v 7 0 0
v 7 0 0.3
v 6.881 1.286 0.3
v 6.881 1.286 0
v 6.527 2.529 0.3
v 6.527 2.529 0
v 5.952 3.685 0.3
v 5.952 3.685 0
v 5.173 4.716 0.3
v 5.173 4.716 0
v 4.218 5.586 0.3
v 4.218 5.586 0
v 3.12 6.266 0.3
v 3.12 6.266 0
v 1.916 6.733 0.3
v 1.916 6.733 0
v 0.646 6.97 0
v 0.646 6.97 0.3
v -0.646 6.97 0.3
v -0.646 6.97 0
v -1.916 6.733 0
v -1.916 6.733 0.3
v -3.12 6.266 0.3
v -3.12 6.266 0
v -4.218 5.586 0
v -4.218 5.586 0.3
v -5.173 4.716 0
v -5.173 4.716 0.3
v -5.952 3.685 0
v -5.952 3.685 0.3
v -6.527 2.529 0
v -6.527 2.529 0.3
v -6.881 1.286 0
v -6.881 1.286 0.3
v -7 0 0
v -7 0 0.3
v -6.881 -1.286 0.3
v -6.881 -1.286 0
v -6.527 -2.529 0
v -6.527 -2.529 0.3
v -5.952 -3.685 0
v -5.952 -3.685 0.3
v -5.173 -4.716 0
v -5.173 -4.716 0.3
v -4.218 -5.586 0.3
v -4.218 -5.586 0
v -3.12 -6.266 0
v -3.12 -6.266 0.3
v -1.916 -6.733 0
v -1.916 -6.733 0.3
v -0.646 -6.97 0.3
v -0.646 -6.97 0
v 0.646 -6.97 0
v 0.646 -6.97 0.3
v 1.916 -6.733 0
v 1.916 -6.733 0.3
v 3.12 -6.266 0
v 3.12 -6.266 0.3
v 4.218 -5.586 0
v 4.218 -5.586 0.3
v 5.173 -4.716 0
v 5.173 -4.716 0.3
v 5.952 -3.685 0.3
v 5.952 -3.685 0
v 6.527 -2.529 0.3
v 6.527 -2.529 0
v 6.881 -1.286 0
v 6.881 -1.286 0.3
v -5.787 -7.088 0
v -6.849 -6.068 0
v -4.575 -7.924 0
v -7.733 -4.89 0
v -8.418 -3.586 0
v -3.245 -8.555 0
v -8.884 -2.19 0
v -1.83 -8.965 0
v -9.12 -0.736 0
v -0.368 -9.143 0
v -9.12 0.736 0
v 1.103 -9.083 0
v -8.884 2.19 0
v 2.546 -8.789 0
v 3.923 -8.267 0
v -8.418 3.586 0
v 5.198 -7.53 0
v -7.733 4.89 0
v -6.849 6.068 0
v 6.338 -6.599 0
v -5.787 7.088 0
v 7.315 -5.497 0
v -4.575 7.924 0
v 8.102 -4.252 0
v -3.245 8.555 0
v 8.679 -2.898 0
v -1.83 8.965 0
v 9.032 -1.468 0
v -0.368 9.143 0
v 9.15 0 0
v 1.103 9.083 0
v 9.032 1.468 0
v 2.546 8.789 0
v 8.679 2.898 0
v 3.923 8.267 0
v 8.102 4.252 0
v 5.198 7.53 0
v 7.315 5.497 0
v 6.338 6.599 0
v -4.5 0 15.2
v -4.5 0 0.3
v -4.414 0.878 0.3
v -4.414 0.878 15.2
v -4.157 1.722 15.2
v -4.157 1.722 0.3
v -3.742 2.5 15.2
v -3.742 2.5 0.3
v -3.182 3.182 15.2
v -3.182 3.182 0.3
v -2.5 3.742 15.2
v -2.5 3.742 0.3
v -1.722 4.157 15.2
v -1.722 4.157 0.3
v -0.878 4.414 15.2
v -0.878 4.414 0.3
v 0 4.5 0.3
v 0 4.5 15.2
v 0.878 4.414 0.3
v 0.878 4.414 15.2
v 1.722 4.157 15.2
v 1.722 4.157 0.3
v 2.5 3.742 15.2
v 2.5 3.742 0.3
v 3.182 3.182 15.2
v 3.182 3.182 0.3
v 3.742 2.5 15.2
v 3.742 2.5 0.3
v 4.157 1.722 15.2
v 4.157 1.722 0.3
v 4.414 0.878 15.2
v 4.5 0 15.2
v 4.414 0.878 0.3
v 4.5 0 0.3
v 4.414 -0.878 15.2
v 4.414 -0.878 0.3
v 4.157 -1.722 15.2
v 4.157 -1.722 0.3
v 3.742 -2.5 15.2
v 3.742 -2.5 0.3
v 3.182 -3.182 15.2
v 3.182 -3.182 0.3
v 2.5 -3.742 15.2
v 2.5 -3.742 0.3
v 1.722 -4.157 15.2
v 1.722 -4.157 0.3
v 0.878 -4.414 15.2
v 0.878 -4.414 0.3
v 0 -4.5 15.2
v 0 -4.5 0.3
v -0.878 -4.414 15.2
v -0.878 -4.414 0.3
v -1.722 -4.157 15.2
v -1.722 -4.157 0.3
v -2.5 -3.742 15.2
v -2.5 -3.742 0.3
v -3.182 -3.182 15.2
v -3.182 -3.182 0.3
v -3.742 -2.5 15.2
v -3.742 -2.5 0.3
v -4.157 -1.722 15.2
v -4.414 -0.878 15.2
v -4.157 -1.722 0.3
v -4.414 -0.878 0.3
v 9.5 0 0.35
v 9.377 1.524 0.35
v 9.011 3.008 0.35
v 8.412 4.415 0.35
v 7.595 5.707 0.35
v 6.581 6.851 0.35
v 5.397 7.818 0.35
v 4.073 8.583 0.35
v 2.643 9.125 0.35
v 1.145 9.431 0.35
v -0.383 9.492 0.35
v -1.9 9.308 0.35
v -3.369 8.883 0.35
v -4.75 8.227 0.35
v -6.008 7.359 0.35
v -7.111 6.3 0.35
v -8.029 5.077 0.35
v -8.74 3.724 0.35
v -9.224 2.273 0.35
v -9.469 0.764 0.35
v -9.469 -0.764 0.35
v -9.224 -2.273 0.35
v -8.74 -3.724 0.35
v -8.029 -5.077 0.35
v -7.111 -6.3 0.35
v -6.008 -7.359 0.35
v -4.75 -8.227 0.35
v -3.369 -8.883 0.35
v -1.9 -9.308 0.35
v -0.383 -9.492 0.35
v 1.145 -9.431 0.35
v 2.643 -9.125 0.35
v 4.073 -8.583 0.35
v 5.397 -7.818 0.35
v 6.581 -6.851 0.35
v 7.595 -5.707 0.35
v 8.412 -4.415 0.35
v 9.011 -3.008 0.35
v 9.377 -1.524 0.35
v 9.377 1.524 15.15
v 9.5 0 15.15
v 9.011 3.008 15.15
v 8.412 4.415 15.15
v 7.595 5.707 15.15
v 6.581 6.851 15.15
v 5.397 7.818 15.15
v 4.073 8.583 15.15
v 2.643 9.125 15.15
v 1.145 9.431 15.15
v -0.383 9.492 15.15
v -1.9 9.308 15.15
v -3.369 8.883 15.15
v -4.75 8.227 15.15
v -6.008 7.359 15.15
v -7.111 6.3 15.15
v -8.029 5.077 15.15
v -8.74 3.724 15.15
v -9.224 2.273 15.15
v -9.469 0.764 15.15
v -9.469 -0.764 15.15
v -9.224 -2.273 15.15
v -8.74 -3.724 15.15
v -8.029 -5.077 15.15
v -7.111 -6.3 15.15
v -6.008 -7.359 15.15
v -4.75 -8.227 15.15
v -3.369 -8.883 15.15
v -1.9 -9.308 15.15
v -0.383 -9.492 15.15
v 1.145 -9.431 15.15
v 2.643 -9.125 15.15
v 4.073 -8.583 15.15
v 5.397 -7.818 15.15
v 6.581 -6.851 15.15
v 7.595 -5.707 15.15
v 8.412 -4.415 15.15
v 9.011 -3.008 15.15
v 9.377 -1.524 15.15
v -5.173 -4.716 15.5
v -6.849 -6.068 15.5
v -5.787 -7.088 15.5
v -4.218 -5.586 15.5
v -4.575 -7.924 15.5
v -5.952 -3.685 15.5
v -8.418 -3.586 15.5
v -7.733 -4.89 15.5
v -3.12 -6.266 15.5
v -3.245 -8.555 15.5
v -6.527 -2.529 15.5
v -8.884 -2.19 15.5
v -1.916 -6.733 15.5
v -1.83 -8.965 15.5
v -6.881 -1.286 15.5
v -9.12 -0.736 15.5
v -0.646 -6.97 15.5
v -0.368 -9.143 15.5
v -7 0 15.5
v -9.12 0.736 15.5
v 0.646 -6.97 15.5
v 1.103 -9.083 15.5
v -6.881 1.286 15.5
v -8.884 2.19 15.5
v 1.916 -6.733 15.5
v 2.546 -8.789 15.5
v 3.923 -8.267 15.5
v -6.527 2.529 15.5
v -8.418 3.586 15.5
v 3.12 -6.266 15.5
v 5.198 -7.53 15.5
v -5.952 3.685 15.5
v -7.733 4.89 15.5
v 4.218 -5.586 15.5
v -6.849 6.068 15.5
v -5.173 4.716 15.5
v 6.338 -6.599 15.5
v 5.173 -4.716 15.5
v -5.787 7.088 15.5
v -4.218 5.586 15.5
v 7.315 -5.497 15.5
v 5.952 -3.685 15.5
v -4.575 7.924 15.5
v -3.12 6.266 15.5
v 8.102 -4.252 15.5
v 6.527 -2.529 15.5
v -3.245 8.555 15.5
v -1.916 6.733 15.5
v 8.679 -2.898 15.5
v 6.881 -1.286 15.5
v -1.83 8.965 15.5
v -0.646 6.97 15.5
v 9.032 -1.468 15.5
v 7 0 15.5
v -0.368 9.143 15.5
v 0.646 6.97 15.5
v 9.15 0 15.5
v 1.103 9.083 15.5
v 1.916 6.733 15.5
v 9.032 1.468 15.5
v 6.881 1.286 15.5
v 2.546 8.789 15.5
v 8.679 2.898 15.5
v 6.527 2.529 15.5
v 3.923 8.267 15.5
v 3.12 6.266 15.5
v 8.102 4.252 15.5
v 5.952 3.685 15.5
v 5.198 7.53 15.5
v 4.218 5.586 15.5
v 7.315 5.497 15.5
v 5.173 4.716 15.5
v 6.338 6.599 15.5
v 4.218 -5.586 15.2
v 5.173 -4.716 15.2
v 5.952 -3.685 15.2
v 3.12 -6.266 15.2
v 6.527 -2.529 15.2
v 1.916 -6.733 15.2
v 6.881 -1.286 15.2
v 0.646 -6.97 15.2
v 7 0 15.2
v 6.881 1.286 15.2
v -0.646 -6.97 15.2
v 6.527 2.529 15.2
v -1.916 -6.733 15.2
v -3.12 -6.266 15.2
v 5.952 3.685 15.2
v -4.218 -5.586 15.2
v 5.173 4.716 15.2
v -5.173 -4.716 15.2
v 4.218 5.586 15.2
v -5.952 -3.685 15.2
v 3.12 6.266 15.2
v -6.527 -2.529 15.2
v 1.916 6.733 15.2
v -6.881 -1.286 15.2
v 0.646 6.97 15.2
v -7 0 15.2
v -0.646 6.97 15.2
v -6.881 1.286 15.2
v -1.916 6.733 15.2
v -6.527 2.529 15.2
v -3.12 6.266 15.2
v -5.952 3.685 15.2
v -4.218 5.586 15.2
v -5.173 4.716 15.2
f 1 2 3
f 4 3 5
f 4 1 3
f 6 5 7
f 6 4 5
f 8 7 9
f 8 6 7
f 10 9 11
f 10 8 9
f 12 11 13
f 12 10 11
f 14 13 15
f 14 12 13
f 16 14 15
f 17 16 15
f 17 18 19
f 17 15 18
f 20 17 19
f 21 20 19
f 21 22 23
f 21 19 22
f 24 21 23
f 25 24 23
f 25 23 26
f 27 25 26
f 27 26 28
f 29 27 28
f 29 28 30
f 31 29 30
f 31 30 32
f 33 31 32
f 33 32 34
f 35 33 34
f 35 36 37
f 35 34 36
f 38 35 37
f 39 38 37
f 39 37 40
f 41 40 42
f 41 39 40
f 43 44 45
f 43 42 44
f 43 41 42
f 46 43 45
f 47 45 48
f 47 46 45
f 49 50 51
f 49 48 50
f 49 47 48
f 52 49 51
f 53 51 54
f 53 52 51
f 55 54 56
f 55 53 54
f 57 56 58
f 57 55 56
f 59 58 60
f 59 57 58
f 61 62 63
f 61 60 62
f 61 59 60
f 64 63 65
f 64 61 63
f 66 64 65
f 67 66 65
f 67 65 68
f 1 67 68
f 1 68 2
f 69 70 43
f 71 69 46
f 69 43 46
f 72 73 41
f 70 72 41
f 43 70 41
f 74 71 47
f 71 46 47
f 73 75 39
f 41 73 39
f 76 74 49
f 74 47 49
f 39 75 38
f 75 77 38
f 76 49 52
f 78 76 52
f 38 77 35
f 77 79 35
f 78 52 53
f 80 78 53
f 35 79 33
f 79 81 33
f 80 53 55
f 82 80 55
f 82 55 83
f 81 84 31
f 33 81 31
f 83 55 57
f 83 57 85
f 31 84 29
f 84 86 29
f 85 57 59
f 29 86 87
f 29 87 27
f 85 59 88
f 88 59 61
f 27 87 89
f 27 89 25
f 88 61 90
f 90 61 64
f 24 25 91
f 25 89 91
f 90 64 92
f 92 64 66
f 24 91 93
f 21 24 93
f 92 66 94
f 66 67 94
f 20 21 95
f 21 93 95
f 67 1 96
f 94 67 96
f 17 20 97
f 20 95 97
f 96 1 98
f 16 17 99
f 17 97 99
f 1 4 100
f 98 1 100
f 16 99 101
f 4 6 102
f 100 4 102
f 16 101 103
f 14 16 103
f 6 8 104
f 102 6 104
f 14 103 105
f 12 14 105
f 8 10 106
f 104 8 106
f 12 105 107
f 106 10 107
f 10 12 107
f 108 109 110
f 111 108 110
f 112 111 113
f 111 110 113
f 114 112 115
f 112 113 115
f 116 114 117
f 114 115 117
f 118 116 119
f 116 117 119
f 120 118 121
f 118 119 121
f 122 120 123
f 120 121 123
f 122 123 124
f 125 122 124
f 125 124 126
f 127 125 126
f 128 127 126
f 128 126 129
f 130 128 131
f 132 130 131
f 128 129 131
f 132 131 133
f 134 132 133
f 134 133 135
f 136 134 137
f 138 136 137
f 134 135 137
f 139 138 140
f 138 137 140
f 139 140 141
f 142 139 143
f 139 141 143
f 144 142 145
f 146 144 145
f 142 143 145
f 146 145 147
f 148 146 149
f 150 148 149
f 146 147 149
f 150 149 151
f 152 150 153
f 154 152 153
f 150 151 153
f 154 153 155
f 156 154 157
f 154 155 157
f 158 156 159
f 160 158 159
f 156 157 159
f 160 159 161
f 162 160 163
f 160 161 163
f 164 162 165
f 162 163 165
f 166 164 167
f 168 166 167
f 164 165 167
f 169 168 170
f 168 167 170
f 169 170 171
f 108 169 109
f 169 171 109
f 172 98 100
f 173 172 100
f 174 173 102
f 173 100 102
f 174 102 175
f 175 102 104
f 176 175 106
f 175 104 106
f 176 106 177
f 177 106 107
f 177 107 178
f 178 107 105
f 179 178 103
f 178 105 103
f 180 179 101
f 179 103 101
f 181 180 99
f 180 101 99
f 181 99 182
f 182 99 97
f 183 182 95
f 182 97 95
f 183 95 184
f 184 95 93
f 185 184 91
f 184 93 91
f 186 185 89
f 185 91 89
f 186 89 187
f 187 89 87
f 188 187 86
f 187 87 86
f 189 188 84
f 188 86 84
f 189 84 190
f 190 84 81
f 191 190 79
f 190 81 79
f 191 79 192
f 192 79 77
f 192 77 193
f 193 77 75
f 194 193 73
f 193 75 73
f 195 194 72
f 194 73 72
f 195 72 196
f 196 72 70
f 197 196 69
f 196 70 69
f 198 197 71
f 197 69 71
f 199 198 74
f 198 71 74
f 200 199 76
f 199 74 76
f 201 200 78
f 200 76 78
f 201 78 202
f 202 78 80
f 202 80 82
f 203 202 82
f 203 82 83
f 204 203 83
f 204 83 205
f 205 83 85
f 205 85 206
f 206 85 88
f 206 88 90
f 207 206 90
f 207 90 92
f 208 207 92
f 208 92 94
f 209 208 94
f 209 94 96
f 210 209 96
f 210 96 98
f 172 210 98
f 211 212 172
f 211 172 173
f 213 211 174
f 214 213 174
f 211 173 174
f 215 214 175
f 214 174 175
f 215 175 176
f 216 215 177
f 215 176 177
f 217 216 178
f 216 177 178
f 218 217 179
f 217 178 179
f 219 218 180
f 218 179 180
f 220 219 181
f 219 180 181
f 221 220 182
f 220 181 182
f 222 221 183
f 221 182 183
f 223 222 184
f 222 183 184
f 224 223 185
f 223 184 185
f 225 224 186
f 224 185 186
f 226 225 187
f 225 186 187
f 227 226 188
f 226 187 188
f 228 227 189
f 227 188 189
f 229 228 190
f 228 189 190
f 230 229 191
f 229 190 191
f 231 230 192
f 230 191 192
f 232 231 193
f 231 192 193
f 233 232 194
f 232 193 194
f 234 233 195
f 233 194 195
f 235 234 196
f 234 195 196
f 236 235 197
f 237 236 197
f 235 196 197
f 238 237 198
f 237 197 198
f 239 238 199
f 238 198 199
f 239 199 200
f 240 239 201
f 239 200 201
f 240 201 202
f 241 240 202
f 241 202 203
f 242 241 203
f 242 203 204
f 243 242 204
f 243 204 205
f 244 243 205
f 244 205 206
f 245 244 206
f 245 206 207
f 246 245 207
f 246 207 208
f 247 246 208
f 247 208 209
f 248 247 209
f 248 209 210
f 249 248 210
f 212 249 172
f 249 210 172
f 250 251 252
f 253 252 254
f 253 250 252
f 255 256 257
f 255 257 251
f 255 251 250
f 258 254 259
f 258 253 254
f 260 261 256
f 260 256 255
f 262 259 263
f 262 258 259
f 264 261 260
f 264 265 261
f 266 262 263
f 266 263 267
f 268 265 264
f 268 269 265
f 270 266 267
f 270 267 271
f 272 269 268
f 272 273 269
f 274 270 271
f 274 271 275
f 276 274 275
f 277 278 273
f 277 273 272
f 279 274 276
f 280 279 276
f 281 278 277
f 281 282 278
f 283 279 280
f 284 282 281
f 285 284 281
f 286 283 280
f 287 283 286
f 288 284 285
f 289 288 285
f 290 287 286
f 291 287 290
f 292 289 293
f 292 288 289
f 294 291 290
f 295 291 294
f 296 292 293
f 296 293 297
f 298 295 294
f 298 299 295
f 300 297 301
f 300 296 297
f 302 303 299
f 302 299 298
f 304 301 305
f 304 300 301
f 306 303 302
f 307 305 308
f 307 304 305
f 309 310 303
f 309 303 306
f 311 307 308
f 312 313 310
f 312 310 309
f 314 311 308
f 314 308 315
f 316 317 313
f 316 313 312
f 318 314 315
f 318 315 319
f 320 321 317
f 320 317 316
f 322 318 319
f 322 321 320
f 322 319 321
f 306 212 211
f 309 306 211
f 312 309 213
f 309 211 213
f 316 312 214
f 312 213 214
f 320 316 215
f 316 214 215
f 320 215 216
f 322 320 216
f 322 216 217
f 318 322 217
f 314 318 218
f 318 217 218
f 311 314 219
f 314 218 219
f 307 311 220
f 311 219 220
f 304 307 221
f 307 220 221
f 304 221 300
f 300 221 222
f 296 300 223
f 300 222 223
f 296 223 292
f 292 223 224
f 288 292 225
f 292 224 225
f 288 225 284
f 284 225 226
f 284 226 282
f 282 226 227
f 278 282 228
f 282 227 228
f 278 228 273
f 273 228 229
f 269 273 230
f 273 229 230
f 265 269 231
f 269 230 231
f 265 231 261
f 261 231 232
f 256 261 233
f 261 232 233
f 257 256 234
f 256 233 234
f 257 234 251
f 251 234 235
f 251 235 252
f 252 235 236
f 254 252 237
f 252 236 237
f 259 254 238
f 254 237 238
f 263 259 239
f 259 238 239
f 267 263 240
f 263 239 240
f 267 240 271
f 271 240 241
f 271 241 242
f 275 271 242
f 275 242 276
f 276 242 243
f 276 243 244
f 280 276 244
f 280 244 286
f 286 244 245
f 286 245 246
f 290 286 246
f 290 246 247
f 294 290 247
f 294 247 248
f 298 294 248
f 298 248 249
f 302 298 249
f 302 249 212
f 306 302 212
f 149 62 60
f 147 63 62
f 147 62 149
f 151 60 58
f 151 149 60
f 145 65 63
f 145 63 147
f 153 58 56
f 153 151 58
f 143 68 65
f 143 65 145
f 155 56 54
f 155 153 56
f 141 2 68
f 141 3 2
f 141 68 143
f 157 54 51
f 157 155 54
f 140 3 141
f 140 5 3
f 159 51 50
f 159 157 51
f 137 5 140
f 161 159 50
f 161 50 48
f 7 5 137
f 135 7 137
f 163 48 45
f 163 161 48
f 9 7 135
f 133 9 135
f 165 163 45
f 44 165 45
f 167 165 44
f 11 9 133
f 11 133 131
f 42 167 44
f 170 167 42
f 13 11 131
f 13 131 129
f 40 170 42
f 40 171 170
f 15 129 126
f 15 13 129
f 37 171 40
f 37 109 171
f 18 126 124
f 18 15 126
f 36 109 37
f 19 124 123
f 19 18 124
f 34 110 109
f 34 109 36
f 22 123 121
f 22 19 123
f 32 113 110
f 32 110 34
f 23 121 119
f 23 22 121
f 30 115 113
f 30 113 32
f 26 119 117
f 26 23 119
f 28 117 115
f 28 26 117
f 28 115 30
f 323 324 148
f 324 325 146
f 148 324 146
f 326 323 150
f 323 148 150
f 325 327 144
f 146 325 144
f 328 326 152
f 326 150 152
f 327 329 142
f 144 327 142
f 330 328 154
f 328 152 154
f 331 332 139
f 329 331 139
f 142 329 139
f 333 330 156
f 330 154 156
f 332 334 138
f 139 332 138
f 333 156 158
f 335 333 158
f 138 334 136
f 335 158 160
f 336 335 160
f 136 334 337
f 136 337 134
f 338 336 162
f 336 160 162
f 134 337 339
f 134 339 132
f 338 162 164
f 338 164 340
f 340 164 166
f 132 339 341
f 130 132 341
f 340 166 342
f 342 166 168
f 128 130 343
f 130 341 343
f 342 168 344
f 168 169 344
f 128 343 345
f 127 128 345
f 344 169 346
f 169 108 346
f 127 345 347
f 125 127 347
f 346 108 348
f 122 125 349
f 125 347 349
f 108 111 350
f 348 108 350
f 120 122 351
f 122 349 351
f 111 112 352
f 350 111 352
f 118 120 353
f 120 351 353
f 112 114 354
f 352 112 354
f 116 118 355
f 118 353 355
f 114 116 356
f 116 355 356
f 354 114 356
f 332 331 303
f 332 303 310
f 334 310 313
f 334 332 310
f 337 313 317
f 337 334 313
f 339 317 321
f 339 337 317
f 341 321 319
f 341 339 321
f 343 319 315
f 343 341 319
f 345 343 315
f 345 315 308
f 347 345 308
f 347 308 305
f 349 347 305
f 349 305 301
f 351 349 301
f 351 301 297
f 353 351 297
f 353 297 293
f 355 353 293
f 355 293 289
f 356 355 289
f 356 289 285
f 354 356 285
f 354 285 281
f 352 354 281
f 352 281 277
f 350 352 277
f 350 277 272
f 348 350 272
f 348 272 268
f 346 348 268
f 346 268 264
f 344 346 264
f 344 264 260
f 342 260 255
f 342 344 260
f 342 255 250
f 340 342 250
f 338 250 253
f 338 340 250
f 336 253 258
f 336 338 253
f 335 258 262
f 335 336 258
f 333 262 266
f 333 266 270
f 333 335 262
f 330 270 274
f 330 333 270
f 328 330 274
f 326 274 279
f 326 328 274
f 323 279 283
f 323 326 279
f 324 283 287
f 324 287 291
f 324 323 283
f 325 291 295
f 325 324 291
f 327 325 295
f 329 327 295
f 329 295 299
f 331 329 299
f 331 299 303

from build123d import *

# Parameters (mm, degrees)
SCHIZZO1_R                   = 9.5
SCHIZZO1_R_2                 = 7
ESTRUSIONE_ESTRUSIONE2_DEPTH = 15.5
SCHIZZO2_R                   = 7
SCHIZZO2_R_2                 = 4.5
ESTRUSIONE_ESTRUSIONE3_DEPTH = 14.9
SMUSSO1_SIZE                 = 0.35


with BuildPart() as part:
    # Schizzo1 → Estrusione-Estrusione2 (new body)
    with BuildSketch(Plane.XY):
        Circle(SCHIZZO1_R)
        Circle(SCHIZZO1_R_2, mode=Mode.SUBTRACT)
    extrude(amount=ESTRUSIONE_ESTRUSIONE2_DEPTH)

    # Schizzo2 → Estrusione-Estrusione3 (add)
    with BuildSketch(Plane(origin=(0, 0, 0.3), x_dir=(-1, 0, 0), z_dir=(0, 0, -1))):
        Circle(SCHIZZO2_R)
        Circle(SCHIZZO2_R_2, mode=Mode.SUBTRACT)
    extrude(amount=-ESTRUSIONE_ESTRUSIONE3_DEPTH)

    # Smusso1
    smusso1_edges = [part.edges().sort_by_distance(p)[0] for p in [
        (-9.5, 0, 0),
        (-9.5, 0, 15.5),
    ]]
    chamfer(smusso1_edges, length=SMUSSO1_SIZE)


solid = part.part
